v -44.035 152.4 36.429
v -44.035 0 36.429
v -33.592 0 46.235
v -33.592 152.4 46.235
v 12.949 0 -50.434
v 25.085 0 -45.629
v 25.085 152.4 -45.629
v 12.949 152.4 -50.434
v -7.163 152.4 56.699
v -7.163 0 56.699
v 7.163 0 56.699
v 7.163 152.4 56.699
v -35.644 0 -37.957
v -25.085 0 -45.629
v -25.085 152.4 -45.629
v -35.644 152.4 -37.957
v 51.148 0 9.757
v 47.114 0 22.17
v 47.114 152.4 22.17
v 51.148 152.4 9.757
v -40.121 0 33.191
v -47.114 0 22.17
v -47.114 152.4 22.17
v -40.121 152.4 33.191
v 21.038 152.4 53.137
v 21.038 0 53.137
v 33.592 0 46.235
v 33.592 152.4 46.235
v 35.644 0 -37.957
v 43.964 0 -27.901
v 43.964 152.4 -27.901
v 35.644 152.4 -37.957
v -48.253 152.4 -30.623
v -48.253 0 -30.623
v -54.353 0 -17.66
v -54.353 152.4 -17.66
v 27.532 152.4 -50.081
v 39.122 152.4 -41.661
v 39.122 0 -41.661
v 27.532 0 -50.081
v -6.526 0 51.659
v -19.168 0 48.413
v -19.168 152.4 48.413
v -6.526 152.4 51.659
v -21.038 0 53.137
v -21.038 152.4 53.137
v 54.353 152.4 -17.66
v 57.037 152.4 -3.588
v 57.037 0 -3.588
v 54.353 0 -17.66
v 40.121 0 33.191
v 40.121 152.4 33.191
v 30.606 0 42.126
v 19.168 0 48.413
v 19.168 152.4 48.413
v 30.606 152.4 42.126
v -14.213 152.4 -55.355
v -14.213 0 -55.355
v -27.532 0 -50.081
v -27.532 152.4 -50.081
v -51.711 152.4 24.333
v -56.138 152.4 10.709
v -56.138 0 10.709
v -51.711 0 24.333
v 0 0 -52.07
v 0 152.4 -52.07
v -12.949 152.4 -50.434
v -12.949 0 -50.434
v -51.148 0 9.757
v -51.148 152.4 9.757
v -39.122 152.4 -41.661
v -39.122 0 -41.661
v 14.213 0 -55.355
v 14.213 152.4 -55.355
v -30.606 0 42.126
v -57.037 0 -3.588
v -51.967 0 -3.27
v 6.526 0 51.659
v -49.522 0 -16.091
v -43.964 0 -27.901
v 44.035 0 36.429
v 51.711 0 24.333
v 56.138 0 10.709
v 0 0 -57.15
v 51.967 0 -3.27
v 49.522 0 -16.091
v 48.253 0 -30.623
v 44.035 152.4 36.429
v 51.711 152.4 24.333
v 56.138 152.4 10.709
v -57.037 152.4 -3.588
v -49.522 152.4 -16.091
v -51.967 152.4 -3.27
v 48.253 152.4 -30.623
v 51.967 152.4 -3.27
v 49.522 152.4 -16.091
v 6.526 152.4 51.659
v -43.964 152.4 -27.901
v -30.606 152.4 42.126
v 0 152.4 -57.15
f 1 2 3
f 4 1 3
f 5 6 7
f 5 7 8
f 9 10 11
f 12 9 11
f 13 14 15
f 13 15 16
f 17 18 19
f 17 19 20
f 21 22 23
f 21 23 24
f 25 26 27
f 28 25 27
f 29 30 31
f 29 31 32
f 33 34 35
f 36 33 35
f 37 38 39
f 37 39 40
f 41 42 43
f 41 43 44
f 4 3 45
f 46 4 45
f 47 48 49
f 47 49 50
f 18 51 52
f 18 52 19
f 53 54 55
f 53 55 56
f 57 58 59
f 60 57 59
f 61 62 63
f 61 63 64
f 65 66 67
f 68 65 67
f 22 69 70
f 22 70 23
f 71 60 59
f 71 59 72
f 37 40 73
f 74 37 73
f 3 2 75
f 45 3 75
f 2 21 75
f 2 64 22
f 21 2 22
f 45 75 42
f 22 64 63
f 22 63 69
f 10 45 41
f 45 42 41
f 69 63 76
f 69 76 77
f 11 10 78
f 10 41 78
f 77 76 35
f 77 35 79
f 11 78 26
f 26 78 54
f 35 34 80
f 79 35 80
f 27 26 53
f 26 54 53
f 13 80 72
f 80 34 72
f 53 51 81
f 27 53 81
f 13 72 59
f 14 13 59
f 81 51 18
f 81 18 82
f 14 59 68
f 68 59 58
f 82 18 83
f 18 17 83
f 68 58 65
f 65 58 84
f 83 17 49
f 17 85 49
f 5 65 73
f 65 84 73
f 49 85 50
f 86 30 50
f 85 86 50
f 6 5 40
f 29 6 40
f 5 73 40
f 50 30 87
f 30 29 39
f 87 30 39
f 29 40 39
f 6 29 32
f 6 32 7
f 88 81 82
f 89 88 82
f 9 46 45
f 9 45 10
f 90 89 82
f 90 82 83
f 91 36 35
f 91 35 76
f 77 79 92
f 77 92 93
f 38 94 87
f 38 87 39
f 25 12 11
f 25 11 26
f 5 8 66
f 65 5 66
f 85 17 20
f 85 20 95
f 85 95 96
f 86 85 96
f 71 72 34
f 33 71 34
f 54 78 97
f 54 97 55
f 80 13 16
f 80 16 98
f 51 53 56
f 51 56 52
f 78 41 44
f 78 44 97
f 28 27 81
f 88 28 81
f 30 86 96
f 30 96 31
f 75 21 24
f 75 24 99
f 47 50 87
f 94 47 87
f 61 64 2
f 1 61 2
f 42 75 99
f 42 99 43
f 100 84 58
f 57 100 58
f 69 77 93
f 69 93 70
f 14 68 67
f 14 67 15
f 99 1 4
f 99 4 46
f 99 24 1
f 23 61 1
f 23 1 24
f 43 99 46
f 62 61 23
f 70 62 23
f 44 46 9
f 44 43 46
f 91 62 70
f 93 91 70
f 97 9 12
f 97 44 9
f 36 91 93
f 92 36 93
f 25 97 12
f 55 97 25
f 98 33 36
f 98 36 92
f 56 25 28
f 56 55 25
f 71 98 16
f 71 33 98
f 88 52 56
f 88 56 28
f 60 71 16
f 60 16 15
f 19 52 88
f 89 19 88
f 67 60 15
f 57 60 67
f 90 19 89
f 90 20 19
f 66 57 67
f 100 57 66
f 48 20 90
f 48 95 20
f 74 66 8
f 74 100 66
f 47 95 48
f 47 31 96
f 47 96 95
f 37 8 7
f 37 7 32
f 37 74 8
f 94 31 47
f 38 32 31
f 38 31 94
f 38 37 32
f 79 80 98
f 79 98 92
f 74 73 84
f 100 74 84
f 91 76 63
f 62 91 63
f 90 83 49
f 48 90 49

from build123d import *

# Parameters (mm, degrees)
BOSS_EXTRUDE1_DEPTH = 152.4


with BuildPart() as part:
    # Sketch2 → Boss-Extrude1 (new body)
    with BuildSketch(Plane(origin=(0, 0, 0), x_dir=(1, 0, 0), z_dir=(0, 1, 0))):
        Polygon((0, 57.15), (-14.212627051, 55.354527659), (-27.532222475, 50.080926765), (-39.121867104, 41.660557057), (-48.253340942, 30.622501333), (-54.352879906, 17.660321229), (-57.03722753, 3.588478191), (-56.137716379, -10.708842129), (-51.710866048, -24.333286513), (-44.034831825, -36.428781014), (-33.591927169, -46.235321229), (-21.038318186, -53.136726169), (-7.162794298, -56.69935518), (7.162794298, -56.69935518), (21.038318186, -53.136726169), (33.591927169, -46.235321229), (44.034831825, -36.428781014), (51.710866048, -24.333286513), (56.137716379, -10.708842129), (57.03722753, 3.588478191), (54.352879906, 17.660321229), (48.253340942, 30.622501333), (39.121867104, 41.660557057), (27.532222475, 50.080926765), (14.212627051, 55.354527659), align=None)
        Polygon((0, 52.07), (-12.949282425, 50.4341252), (-25.08491381, 45.62928883), (-35.644367806, 37.95739643), (-43.964155081, 27.900501215), (-49.521512803, 16.090514897), (-51.967251749, 3.269502352), (-51.147697145, -9.75694505), (-47.114344622, -22.170327712), (-40.120624551, -33.190667146), (-30.605978087, -42.125514897), (-19.168245458, -48.41346162), (-6.526101472, -51.659412497), (6.526101472, -51.659412497), (19.168245458, -48.41346162), (30.605978087, -42.125514897), (40.120624551, -33.190667146), (47.114344622, -22.170327712), (51.147697145, -9.75694505), (51.967251749, 3.269502352), (49.521512803, 16.090514897), (43.964155081, 27.900501215), (35.644367806, 37.95739643), (25.08491381, 45.62928883), (12.949282425, 50.4341252), align=None, mode=Mode.SUBTRACT)
    extrude(amount=BOSS_EXTRUDE1_DEPTH)


solid = part.part
